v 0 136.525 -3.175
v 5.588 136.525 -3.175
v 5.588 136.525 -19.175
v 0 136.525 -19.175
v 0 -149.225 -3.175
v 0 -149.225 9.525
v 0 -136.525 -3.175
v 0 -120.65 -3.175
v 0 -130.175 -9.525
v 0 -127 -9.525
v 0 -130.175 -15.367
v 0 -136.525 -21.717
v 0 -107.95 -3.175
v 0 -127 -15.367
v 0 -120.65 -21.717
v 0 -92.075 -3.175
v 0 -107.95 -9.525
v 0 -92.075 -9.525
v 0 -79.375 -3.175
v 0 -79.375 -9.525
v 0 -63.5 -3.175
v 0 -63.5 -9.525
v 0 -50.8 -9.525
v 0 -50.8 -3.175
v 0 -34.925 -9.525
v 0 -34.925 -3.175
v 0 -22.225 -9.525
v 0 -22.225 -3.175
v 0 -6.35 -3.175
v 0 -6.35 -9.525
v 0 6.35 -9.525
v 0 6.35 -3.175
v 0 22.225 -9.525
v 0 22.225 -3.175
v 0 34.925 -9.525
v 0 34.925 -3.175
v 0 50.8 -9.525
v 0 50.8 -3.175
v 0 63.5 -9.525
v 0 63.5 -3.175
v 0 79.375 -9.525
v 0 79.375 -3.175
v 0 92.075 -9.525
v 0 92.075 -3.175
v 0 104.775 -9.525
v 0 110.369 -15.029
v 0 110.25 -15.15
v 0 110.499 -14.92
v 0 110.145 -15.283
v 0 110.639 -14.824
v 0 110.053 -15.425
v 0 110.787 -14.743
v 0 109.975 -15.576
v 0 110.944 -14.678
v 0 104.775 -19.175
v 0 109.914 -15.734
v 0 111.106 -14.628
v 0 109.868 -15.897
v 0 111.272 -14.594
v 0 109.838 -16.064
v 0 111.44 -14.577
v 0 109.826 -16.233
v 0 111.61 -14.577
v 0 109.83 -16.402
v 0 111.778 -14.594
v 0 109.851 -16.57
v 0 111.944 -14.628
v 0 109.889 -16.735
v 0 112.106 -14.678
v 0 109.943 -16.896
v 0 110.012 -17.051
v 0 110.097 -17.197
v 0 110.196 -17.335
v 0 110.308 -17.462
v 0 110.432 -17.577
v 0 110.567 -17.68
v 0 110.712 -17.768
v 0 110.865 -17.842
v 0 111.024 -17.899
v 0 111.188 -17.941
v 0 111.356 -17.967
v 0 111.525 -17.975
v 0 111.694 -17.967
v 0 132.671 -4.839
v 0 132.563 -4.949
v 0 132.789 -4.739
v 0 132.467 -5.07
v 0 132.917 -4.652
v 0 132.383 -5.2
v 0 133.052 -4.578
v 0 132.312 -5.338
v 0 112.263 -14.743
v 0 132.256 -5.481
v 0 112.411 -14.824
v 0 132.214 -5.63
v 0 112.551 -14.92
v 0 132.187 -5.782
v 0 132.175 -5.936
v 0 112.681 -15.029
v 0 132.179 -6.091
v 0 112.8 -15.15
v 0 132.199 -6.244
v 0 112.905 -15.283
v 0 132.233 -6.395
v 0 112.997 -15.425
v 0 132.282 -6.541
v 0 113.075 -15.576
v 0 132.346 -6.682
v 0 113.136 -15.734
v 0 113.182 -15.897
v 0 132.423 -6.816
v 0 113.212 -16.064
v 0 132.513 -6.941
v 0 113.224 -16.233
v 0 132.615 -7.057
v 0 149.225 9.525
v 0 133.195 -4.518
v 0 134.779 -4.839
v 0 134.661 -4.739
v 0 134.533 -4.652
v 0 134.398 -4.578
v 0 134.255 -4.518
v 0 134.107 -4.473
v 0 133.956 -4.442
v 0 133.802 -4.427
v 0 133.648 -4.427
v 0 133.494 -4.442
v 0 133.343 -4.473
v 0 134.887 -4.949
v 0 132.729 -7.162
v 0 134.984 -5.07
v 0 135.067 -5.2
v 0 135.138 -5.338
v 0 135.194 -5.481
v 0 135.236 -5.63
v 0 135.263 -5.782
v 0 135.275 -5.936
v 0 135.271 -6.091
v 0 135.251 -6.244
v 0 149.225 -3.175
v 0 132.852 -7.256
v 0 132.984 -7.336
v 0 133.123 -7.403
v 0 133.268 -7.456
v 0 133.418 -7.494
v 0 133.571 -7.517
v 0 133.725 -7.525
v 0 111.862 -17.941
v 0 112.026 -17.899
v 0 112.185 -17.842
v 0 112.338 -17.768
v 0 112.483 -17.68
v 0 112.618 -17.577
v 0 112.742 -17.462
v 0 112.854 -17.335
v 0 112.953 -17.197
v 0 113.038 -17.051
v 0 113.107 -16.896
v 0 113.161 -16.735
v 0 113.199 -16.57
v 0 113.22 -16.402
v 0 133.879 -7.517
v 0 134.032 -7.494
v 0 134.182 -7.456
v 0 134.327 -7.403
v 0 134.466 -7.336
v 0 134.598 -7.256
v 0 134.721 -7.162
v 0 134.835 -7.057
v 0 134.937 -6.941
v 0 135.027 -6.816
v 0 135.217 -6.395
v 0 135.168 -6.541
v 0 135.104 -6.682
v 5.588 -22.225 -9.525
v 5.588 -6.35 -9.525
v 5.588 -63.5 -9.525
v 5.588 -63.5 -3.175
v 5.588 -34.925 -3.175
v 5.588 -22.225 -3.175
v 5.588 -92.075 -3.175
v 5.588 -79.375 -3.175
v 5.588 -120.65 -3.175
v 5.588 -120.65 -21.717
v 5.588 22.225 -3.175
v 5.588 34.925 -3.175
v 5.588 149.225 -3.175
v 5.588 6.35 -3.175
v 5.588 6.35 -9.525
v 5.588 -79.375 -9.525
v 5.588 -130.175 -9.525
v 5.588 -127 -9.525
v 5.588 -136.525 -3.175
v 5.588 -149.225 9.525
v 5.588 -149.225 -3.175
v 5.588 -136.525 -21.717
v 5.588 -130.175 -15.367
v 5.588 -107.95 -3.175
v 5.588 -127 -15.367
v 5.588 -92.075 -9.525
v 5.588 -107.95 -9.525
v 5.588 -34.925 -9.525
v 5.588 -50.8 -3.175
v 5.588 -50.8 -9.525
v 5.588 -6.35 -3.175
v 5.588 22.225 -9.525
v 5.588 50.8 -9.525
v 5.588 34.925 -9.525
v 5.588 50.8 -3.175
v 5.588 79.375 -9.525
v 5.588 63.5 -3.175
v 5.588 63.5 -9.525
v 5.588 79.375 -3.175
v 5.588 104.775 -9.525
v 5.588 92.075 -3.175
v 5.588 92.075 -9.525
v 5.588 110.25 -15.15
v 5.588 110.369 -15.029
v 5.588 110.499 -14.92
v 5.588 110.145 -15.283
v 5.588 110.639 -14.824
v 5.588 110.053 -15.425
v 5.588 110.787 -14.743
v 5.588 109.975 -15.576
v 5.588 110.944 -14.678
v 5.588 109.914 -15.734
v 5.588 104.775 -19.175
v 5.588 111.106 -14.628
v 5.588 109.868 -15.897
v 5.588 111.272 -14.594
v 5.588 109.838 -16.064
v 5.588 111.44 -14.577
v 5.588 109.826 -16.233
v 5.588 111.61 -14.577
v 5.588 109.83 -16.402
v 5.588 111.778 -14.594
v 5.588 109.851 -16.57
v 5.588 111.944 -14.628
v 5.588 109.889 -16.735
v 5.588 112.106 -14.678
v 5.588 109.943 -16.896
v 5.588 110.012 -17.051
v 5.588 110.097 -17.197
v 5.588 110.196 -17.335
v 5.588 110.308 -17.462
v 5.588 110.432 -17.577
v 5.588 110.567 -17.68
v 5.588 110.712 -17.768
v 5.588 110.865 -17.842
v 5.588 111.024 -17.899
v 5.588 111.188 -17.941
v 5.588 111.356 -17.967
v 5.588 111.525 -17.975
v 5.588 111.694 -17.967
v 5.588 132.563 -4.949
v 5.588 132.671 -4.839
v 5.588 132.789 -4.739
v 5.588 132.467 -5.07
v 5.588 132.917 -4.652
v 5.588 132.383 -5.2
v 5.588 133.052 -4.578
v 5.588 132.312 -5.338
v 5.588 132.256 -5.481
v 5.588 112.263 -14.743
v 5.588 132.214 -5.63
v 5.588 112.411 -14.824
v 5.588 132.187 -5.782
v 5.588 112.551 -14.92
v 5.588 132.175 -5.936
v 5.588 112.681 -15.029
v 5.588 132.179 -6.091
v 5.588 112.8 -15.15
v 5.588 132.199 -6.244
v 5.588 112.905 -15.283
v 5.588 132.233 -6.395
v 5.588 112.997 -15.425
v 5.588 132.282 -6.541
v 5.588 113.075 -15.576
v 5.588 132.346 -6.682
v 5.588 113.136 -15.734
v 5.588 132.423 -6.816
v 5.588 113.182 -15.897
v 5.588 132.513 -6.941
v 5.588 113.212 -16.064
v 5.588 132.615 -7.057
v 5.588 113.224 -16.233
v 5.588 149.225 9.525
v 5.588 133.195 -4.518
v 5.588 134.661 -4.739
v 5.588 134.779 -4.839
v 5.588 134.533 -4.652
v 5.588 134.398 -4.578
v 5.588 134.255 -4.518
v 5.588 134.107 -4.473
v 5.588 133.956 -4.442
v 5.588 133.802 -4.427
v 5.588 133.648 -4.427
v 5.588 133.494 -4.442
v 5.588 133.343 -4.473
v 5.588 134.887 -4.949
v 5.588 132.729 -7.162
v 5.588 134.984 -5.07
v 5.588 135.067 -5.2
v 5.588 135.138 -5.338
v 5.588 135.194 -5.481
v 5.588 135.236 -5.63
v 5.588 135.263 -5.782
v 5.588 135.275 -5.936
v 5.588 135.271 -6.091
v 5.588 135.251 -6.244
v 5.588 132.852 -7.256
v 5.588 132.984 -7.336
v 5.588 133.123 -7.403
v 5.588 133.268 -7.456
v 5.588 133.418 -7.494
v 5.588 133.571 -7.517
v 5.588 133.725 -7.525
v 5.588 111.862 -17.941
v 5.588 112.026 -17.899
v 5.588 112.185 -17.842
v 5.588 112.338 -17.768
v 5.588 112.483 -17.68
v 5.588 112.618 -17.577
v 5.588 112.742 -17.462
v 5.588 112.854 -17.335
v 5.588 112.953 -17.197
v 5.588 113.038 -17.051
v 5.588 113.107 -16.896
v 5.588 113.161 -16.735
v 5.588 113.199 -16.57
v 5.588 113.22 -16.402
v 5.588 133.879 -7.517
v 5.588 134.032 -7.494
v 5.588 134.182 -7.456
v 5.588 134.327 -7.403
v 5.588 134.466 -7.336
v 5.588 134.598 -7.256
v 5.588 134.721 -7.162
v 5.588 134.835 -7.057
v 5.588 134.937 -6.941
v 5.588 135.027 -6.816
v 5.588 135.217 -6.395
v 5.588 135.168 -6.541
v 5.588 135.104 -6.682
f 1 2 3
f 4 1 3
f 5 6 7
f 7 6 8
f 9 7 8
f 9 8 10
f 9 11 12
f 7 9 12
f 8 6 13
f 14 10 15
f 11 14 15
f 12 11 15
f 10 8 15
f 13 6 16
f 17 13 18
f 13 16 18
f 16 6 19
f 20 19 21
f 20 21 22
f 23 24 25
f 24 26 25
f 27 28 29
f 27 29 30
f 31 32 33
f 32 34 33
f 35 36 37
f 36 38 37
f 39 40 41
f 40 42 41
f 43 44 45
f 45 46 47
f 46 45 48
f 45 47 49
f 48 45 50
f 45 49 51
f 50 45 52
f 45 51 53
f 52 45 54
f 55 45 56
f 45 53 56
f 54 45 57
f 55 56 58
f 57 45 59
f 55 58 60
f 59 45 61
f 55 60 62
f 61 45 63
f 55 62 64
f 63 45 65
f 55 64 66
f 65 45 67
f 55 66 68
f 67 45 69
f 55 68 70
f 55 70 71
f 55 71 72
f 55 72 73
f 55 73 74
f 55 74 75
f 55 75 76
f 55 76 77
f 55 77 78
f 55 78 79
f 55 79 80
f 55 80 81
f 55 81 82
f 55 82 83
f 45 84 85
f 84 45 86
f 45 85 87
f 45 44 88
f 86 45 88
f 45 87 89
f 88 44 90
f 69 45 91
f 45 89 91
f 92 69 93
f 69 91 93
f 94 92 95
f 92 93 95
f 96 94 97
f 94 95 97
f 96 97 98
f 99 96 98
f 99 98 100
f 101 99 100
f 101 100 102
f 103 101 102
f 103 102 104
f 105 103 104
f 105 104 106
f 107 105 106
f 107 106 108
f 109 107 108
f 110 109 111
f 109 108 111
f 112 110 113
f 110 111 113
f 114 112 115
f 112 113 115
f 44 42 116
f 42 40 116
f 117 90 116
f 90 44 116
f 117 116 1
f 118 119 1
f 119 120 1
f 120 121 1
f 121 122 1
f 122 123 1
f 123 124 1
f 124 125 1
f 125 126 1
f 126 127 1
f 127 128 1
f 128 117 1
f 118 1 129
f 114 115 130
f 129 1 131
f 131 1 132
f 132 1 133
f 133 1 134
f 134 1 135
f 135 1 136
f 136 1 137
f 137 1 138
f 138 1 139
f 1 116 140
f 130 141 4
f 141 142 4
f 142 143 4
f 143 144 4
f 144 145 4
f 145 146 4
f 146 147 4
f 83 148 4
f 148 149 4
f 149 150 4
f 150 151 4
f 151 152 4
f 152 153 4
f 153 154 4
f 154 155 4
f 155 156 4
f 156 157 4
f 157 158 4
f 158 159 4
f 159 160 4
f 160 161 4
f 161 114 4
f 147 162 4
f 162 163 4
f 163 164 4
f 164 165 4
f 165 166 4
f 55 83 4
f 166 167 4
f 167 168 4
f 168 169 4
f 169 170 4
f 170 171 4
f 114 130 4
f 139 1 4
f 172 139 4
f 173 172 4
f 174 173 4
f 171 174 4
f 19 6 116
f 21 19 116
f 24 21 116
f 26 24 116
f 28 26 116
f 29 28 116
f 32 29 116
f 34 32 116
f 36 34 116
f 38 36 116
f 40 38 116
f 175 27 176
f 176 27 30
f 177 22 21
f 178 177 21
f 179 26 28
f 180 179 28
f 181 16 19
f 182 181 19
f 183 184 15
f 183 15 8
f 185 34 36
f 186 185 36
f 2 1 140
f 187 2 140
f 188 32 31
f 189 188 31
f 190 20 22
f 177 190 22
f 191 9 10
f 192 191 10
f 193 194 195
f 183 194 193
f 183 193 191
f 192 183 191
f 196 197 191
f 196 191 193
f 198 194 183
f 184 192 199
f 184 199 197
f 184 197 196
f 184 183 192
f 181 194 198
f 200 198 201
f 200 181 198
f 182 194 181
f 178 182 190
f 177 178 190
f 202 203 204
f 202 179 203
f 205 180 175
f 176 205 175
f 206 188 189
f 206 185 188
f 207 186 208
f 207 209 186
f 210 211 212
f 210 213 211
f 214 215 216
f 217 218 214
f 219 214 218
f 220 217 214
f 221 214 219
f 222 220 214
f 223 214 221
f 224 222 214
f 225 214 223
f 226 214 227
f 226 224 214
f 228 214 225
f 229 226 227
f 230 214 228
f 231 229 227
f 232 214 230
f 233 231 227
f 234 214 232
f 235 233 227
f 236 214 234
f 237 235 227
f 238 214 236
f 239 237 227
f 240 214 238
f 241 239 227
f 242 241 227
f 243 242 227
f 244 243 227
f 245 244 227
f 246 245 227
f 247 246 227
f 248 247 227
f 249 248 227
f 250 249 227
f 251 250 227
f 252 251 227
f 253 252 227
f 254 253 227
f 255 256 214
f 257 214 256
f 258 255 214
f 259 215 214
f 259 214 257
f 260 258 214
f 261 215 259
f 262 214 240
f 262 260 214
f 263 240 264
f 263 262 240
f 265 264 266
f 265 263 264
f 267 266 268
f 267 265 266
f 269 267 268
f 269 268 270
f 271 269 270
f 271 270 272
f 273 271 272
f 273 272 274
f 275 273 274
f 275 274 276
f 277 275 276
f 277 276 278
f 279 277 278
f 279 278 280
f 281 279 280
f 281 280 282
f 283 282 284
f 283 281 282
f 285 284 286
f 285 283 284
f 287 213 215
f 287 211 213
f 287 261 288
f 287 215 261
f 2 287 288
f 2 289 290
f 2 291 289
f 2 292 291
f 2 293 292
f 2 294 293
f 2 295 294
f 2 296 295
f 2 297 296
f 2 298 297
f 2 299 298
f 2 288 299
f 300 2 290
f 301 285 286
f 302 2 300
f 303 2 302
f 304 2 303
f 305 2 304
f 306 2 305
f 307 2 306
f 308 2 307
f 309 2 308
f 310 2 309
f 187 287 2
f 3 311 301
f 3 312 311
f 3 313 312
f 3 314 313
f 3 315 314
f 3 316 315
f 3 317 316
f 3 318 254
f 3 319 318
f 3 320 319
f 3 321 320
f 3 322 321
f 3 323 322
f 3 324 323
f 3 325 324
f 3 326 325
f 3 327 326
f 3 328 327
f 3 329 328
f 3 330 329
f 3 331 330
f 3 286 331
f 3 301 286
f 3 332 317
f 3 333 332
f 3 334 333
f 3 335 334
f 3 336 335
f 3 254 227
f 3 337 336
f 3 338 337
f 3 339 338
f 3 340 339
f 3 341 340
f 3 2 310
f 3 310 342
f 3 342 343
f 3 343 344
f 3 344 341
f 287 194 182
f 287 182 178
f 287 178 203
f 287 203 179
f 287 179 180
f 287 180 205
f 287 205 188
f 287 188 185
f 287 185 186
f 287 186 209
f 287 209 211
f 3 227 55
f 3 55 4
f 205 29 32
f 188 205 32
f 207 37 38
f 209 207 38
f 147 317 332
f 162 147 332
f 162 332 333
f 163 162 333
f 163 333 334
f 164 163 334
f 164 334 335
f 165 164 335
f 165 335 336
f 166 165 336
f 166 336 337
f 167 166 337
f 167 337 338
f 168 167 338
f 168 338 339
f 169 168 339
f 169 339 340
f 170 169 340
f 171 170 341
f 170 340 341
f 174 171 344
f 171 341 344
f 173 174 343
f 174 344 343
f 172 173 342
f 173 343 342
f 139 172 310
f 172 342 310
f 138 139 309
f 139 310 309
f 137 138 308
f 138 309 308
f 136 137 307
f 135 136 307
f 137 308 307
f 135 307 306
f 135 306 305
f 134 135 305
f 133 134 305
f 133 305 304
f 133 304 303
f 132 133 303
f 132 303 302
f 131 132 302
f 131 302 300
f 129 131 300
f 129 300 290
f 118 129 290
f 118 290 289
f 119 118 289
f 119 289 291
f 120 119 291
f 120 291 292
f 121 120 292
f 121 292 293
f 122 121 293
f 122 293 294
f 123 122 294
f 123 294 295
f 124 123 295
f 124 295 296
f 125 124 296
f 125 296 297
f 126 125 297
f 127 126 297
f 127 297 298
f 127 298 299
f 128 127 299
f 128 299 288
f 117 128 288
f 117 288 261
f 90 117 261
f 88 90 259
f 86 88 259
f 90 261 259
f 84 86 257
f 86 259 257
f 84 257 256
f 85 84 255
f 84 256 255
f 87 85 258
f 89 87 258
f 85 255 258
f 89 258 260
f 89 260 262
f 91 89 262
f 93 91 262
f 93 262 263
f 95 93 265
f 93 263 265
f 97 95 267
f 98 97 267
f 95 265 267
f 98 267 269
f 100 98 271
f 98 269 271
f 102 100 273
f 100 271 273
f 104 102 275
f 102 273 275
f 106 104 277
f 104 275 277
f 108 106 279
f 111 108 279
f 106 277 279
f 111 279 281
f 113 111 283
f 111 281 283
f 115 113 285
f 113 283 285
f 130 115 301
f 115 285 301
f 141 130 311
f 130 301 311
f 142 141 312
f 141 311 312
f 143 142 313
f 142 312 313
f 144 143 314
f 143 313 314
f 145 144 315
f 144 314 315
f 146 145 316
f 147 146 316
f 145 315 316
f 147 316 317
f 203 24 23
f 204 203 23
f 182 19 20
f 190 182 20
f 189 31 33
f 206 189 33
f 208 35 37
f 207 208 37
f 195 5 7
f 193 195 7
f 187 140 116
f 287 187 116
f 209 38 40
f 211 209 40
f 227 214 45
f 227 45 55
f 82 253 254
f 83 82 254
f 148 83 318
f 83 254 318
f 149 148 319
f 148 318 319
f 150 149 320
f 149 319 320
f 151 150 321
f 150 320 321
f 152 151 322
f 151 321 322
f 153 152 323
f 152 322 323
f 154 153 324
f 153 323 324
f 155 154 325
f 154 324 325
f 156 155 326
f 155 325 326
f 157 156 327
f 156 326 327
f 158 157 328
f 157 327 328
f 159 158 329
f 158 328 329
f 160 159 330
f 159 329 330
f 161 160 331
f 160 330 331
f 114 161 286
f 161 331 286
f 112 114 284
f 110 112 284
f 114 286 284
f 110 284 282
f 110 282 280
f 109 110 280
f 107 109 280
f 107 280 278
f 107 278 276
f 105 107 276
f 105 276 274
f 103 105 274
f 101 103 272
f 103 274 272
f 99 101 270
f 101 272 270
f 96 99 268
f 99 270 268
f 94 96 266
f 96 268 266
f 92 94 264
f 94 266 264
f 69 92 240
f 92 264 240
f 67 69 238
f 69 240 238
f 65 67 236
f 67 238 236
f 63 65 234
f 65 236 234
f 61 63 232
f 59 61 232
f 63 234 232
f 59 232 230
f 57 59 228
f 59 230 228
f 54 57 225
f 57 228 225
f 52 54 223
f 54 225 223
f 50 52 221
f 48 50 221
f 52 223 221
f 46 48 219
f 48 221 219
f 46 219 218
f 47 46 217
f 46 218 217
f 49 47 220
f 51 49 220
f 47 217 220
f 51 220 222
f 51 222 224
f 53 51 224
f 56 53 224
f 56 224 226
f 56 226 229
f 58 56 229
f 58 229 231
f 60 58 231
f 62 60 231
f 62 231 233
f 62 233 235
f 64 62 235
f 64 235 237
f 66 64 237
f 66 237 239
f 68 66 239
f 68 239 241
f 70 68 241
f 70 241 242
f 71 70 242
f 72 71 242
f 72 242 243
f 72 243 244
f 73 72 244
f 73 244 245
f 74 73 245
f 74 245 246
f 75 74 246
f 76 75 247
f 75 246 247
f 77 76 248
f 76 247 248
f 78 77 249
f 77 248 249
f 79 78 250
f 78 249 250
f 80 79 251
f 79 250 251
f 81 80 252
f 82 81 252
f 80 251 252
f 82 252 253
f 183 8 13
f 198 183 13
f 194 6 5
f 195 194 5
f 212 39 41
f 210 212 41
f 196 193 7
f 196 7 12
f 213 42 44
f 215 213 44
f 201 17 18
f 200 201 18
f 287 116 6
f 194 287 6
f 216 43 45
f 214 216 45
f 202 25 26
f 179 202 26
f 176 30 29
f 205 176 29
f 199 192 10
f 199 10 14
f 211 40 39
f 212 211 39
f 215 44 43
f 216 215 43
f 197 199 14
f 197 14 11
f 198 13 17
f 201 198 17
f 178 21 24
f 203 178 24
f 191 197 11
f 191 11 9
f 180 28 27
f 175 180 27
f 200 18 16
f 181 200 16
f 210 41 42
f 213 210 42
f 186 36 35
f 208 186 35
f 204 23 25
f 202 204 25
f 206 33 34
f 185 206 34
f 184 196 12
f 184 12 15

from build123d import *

# Parameters (mm, degrees)
BOSS_EXTRUDE1_DEPTH = 5.588
SKETCH2_W           = 15.9999934
SKETCH2_H           = 31.75
SKETCH2_R           = 1.55
SKETCH2_R_2         = 1.7
BOSS_EXTRUDE2_DEPTH = 5.588
SKETCH2_4_R         = 1.55
CUT_EXTRUDE1_DEPTH  = 6.588


with BuildPart() as part:
    # Sketch1 → Boss-Extrude1 (new body)
    with BuildSketch(Plane(origin=(0, 0, 0), x_dir=(0, 0, -1), z_dir=(1, 0, 0))):
        Polygon((3.175, 120.65), (9.525, 120.65), (9.525, 136.525), (3.175, 136.525), (3.175, 149.225), (-9.525, 149.225), (-9.525, -149.225), (3.175, -149.225), (3.175, -136.525), (9.525, -136.525), (9.525, -120.65), (3.175, -120.65), (3.175, -107.95), (9.525, -107.95), (9.525, -92.075), (3.175, -92.075), (3.175, -79.375), (9.525, -79.375), (9.525, -63.5), (3.175, -63.5), (3.175, -50.8), (9.525, -50.8), (9.525, -34.925), (3.175, -34.925), (3.175, -22.225), (9.525, -22.225), (9.525, -6.35), (3.175, -6.35), (3.175, 6.35), (9.525, 6.35), (9.525, 22.225), (3.175, 22.225), (3.175, 34.925), (9.525, 34.925), (9.525, 50.8), (3.175, 50.8), (3.175, 63.5), (9.525, 63.5), (9.525, 79.375), (3.175, 79.375), (3.175, 92.075), (9.525, 92.075), (9.525, 107.95), (3.175, 107.95), align=None)
    extrude(amount=BOSS_EXTRUDE1_DEPTH)

    # Sketch2 → Boss-Extrude2 (add)
    with BuildSketch(Plane(origin=(5.588, 0, 0), x_dir=(0, 0, -1), z_dir=(1, 0, 0))):
        Polygon((21.717, -120.65), (9.525, -120.65), (9.525, -127), (15.367, -127), (15.367, -130.175), (9.525, -130.175), (9.525, -136.525), (21.717, -136.525), align=None)
        with Locations((11.1749967, 120.65)):
            Rectangle(SKETCH2_W, SKETCH2_H)
        with Locations((5.9749992, 133.7250056)):
            Circle(SKETCH2_R, mode=Mode.SUBTRACT)
        with Locations((16.2749992, 111.5250056)):
            Circle(SKETCH2_R_2, mode=Mode.SUBTRACT)
    extrude(amount=-BOSS_EXTRUDE2_DEPTH)

    # Sketch2<4> → Cut-Extrude1 (cut, through all)
    with BuildSketch(Plane(origin=(5.588, 0, 0), x_dir=(0, 0, -1), z_dir=(1, 0, 0))):
        with Locations((5.9749992, 133.7250056)):
            Circle(SKETCH2_4_R)
    extrude(amount=-CUT_EXTRUDE1_DEPTH, mode=Mode.SUBTRACT)


solid = part.part
